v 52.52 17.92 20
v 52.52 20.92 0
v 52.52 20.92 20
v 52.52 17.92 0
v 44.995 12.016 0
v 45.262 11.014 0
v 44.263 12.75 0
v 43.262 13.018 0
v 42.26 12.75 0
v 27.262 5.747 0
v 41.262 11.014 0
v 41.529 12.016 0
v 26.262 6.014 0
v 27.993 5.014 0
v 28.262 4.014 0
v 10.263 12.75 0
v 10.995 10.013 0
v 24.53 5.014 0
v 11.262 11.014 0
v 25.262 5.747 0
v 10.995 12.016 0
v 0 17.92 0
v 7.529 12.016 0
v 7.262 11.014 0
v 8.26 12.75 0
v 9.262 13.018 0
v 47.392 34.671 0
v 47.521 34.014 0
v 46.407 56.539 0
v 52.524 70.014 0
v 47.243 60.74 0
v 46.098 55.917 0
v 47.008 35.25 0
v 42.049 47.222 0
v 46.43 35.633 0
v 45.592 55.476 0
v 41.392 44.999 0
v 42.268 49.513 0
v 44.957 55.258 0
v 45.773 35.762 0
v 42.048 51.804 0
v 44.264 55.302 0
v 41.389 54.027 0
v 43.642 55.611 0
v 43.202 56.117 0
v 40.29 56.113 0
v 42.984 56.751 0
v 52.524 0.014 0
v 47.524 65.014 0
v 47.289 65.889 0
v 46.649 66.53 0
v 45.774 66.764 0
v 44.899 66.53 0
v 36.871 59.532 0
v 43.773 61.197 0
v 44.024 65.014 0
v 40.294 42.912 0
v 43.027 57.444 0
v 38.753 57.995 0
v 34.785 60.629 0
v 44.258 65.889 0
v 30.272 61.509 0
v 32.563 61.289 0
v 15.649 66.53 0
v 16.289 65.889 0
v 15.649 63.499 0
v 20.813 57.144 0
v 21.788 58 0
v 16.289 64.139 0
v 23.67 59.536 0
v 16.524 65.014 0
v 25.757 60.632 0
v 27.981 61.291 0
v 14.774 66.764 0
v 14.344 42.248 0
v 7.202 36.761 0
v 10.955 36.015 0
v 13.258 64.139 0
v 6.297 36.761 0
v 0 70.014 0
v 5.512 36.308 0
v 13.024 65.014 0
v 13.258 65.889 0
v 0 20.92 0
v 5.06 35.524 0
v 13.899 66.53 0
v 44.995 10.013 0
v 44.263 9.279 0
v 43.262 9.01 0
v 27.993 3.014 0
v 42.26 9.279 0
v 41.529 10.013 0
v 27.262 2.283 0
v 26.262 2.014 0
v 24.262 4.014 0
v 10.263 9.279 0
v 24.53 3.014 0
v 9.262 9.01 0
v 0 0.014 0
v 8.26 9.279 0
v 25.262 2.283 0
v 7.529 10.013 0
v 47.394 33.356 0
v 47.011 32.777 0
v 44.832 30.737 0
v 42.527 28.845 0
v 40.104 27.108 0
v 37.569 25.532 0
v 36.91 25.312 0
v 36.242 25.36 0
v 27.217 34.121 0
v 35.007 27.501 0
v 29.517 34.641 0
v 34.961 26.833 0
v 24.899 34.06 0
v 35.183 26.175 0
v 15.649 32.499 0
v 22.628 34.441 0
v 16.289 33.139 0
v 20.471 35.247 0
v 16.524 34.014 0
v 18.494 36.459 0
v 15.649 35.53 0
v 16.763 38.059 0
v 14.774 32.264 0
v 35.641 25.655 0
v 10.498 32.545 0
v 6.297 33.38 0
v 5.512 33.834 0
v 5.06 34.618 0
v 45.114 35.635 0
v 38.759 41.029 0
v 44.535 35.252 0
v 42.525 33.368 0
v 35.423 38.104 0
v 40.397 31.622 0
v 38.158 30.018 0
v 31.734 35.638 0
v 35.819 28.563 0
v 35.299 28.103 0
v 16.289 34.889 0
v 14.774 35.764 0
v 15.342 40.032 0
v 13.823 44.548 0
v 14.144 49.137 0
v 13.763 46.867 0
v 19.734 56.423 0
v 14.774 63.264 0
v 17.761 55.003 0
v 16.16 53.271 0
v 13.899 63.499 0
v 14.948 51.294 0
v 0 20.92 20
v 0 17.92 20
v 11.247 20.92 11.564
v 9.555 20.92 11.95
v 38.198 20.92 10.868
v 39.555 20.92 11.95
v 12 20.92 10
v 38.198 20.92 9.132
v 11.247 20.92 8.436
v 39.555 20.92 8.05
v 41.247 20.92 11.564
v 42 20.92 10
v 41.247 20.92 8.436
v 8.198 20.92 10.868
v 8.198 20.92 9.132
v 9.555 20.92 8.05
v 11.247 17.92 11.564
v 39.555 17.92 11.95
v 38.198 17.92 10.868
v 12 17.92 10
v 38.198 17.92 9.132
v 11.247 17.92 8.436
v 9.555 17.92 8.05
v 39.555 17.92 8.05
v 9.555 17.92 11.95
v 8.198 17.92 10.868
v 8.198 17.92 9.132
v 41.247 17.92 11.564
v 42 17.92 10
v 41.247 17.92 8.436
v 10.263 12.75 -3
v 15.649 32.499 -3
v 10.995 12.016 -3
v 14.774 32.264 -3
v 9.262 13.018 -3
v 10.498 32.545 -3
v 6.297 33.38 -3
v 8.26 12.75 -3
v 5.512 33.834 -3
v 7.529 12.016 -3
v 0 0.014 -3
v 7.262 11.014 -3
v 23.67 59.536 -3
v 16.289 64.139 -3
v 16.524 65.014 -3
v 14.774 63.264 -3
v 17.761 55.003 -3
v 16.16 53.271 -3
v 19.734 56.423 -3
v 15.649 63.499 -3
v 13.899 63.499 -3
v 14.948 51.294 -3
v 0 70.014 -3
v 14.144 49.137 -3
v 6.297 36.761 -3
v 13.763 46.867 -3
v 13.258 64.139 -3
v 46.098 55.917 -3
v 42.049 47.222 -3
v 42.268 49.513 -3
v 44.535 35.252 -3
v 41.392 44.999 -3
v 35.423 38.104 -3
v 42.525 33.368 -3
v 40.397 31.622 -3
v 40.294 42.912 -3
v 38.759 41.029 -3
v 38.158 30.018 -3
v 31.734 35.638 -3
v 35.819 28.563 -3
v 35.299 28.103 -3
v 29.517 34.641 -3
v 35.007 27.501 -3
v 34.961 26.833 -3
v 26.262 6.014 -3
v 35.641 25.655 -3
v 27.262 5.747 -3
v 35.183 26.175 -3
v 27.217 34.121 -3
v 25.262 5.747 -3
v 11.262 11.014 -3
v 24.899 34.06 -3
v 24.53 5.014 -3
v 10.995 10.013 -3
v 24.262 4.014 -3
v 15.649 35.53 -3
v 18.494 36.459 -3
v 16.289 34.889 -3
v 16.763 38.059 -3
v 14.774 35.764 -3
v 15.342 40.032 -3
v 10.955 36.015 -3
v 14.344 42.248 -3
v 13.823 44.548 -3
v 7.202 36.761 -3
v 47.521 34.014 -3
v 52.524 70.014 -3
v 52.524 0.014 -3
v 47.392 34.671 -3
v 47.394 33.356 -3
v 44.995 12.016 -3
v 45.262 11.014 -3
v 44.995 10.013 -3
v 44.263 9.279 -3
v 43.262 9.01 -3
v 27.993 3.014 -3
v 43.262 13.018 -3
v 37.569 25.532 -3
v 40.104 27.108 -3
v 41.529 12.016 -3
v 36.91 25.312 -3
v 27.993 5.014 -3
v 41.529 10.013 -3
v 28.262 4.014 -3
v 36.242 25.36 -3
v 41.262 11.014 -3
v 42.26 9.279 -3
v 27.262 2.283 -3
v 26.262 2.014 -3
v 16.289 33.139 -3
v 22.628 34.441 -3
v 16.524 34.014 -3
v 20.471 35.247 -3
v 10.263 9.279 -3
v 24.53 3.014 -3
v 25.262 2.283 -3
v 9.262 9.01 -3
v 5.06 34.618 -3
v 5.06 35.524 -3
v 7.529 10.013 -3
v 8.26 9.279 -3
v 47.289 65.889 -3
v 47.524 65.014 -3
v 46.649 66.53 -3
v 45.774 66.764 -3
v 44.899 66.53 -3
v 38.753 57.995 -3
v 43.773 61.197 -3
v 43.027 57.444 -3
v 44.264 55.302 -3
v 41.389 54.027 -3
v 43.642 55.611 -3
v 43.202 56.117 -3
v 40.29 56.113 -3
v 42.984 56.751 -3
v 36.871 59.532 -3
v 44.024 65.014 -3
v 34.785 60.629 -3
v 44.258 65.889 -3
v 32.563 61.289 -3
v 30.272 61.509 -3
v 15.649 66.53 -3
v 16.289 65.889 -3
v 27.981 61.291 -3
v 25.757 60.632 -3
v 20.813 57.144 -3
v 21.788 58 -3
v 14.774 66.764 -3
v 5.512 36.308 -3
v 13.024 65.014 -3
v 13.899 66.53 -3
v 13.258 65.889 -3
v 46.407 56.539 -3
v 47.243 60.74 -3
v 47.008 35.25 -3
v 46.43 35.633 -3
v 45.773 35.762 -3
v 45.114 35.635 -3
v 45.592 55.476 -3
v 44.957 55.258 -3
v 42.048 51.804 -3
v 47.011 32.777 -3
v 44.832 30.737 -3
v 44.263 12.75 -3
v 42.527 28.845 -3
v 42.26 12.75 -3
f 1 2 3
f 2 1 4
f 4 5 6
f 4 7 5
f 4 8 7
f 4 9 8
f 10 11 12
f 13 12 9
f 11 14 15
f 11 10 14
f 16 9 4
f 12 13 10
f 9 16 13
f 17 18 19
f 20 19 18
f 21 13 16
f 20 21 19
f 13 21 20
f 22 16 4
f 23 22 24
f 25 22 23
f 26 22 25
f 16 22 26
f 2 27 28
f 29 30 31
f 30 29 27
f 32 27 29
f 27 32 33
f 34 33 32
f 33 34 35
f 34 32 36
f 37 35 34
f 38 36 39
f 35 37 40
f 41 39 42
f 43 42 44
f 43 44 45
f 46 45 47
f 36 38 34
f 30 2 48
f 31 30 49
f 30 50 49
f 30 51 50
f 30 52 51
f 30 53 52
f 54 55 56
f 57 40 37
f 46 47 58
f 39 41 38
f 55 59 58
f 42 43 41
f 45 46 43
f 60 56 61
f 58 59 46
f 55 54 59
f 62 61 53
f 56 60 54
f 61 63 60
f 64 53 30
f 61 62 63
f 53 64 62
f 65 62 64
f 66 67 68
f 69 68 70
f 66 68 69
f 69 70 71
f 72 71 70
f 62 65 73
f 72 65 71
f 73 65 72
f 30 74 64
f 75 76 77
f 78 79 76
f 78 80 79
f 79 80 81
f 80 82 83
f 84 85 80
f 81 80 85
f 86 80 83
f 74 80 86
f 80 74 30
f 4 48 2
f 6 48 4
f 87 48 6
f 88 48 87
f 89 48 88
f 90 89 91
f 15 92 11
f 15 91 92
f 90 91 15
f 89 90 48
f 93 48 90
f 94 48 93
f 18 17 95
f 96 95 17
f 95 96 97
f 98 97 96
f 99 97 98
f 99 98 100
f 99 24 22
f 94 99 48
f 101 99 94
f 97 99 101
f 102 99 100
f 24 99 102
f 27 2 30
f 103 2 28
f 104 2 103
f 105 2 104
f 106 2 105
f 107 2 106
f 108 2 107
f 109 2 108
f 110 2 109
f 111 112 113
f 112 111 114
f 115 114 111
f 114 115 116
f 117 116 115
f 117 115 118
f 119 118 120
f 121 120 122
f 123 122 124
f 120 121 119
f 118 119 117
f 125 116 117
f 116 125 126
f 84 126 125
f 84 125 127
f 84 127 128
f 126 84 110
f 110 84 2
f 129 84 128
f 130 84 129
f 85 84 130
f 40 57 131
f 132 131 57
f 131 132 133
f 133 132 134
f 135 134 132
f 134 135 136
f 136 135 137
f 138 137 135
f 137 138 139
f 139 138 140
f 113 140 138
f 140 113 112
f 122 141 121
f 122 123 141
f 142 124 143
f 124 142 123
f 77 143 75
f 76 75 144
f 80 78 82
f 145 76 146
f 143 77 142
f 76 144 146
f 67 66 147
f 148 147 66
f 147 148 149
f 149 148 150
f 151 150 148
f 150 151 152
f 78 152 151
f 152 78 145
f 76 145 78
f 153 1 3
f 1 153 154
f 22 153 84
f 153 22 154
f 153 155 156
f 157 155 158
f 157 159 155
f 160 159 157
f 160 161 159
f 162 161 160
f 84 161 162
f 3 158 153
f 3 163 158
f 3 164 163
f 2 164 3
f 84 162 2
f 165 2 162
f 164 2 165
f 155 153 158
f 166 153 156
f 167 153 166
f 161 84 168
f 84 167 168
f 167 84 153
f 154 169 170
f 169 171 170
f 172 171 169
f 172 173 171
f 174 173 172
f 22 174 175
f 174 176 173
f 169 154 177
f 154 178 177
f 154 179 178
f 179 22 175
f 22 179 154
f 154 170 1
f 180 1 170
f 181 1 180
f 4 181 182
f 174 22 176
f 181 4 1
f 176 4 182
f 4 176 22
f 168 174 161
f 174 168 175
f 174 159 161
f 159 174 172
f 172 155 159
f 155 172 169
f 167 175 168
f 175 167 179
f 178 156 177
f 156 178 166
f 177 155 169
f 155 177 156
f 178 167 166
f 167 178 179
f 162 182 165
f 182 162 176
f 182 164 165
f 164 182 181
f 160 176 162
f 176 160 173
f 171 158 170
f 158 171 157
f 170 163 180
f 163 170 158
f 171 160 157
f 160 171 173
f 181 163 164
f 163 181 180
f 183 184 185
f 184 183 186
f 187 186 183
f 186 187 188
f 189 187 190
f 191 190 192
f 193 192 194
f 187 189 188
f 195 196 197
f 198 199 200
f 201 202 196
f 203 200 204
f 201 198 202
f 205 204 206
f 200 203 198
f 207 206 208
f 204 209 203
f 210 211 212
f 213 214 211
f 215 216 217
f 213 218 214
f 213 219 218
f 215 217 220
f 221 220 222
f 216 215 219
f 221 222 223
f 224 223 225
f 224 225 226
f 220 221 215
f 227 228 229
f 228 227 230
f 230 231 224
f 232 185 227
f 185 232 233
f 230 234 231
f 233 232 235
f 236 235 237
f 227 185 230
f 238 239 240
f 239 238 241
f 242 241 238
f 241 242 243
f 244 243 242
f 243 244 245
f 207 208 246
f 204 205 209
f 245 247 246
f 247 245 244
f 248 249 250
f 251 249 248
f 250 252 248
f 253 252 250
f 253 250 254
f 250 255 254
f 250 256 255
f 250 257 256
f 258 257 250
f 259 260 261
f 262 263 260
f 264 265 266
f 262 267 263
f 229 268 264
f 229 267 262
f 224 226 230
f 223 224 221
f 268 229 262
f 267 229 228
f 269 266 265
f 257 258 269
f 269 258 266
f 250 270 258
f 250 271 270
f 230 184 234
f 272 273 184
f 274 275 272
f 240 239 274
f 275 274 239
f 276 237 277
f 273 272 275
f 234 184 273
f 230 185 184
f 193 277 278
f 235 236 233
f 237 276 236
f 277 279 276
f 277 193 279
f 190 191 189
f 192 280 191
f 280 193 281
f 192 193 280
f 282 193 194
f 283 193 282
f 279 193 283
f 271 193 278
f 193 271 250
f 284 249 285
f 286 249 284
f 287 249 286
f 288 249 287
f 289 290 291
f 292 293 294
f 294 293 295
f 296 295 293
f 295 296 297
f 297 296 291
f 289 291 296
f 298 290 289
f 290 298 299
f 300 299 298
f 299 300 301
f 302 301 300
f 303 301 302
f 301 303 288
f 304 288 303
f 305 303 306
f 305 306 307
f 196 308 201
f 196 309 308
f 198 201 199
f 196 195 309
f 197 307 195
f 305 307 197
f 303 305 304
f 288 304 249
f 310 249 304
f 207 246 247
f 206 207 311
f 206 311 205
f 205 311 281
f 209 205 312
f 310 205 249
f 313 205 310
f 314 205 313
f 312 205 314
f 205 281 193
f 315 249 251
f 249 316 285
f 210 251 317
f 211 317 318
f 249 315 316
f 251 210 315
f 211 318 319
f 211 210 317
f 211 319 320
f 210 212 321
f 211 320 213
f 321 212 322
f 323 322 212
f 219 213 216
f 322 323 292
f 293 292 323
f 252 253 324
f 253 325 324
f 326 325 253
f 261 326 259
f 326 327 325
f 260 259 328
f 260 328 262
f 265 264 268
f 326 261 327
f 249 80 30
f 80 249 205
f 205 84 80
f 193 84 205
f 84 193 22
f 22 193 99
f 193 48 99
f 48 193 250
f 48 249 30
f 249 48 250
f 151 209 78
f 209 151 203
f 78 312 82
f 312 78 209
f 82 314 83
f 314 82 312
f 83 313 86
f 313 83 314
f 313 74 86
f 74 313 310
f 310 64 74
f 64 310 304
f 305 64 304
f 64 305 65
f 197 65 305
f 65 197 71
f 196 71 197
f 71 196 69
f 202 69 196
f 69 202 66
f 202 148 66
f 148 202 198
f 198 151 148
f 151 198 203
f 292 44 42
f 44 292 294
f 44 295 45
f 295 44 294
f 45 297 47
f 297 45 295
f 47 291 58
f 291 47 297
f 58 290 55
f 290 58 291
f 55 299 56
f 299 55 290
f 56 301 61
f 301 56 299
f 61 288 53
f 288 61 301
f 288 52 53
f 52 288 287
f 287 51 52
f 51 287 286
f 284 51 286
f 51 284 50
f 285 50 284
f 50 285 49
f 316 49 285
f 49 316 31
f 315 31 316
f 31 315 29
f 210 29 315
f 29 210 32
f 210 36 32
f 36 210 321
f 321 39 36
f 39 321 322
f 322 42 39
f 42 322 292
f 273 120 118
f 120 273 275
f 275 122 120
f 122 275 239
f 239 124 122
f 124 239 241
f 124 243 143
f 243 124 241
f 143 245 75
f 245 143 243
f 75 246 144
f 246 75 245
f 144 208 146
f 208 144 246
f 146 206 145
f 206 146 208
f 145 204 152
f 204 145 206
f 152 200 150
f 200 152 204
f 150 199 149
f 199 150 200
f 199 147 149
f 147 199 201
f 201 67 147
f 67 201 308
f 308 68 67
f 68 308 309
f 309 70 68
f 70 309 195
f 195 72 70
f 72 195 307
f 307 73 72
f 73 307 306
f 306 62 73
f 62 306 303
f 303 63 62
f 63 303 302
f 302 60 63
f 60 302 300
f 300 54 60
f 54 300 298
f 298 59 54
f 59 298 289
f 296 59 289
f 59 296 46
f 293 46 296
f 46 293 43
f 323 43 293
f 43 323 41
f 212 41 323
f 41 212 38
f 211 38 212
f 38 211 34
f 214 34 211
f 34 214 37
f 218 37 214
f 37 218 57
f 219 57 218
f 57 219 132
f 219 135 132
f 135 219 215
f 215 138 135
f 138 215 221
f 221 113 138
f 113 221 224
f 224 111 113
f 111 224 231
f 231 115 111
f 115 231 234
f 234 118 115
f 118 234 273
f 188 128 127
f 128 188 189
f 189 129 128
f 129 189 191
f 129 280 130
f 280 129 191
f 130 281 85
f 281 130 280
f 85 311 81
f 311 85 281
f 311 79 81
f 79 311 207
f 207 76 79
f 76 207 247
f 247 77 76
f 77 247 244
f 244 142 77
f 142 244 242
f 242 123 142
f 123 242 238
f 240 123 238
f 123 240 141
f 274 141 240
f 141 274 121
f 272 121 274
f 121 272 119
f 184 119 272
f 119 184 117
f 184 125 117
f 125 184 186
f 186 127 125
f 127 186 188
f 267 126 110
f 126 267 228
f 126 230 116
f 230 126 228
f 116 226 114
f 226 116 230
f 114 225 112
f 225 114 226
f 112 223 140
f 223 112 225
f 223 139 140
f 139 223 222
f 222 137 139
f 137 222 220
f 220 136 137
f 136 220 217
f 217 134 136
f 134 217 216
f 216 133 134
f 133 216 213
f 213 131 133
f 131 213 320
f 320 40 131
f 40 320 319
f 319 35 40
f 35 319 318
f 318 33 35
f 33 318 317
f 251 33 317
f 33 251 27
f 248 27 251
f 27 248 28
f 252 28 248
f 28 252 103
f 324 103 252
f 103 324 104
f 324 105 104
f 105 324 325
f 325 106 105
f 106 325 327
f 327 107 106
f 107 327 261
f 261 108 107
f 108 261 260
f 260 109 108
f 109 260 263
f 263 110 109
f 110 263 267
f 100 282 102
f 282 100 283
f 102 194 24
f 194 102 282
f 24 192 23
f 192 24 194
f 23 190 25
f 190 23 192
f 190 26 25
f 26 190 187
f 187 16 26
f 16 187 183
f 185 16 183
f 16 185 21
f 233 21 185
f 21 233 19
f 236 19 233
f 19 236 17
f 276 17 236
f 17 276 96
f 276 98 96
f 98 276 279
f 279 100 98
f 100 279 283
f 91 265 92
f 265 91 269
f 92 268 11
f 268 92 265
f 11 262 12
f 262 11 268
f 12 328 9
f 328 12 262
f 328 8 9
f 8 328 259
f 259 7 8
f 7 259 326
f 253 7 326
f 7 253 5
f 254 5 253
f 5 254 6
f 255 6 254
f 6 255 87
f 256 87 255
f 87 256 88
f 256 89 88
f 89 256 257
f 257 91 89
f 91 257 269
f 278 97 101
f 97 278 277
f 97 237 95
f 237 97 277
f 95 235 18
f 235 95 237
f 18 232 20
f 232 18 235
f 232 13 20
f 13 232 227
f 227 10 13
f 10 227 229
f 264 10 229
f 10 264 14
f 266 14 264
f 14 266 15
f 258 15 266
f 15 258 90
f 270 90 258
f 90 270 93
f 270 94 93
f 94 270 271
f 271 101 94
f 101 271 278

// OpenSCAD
//rh: mirror([0,0,0])
//lh: mirror([1,0,0])  

mirror([1,0,0])rotate([0,180,0]) {
    translate([-294.24,17.4+70,0]){
        linear_extrude(3)import("stepperMount_lh_IS.dxf",layer="bracket");
    }
    difference() {
        translate([0,17.92,-20])cube([52.52,3,20]);
        translate([10,17.92+5,-10])rotate([90,0,0])cylinder(h=5,d=4);
        translate([50-10,17.92+5,-10])rotate([90,0,0])cylinder(h=5,d=4);
    }
}
